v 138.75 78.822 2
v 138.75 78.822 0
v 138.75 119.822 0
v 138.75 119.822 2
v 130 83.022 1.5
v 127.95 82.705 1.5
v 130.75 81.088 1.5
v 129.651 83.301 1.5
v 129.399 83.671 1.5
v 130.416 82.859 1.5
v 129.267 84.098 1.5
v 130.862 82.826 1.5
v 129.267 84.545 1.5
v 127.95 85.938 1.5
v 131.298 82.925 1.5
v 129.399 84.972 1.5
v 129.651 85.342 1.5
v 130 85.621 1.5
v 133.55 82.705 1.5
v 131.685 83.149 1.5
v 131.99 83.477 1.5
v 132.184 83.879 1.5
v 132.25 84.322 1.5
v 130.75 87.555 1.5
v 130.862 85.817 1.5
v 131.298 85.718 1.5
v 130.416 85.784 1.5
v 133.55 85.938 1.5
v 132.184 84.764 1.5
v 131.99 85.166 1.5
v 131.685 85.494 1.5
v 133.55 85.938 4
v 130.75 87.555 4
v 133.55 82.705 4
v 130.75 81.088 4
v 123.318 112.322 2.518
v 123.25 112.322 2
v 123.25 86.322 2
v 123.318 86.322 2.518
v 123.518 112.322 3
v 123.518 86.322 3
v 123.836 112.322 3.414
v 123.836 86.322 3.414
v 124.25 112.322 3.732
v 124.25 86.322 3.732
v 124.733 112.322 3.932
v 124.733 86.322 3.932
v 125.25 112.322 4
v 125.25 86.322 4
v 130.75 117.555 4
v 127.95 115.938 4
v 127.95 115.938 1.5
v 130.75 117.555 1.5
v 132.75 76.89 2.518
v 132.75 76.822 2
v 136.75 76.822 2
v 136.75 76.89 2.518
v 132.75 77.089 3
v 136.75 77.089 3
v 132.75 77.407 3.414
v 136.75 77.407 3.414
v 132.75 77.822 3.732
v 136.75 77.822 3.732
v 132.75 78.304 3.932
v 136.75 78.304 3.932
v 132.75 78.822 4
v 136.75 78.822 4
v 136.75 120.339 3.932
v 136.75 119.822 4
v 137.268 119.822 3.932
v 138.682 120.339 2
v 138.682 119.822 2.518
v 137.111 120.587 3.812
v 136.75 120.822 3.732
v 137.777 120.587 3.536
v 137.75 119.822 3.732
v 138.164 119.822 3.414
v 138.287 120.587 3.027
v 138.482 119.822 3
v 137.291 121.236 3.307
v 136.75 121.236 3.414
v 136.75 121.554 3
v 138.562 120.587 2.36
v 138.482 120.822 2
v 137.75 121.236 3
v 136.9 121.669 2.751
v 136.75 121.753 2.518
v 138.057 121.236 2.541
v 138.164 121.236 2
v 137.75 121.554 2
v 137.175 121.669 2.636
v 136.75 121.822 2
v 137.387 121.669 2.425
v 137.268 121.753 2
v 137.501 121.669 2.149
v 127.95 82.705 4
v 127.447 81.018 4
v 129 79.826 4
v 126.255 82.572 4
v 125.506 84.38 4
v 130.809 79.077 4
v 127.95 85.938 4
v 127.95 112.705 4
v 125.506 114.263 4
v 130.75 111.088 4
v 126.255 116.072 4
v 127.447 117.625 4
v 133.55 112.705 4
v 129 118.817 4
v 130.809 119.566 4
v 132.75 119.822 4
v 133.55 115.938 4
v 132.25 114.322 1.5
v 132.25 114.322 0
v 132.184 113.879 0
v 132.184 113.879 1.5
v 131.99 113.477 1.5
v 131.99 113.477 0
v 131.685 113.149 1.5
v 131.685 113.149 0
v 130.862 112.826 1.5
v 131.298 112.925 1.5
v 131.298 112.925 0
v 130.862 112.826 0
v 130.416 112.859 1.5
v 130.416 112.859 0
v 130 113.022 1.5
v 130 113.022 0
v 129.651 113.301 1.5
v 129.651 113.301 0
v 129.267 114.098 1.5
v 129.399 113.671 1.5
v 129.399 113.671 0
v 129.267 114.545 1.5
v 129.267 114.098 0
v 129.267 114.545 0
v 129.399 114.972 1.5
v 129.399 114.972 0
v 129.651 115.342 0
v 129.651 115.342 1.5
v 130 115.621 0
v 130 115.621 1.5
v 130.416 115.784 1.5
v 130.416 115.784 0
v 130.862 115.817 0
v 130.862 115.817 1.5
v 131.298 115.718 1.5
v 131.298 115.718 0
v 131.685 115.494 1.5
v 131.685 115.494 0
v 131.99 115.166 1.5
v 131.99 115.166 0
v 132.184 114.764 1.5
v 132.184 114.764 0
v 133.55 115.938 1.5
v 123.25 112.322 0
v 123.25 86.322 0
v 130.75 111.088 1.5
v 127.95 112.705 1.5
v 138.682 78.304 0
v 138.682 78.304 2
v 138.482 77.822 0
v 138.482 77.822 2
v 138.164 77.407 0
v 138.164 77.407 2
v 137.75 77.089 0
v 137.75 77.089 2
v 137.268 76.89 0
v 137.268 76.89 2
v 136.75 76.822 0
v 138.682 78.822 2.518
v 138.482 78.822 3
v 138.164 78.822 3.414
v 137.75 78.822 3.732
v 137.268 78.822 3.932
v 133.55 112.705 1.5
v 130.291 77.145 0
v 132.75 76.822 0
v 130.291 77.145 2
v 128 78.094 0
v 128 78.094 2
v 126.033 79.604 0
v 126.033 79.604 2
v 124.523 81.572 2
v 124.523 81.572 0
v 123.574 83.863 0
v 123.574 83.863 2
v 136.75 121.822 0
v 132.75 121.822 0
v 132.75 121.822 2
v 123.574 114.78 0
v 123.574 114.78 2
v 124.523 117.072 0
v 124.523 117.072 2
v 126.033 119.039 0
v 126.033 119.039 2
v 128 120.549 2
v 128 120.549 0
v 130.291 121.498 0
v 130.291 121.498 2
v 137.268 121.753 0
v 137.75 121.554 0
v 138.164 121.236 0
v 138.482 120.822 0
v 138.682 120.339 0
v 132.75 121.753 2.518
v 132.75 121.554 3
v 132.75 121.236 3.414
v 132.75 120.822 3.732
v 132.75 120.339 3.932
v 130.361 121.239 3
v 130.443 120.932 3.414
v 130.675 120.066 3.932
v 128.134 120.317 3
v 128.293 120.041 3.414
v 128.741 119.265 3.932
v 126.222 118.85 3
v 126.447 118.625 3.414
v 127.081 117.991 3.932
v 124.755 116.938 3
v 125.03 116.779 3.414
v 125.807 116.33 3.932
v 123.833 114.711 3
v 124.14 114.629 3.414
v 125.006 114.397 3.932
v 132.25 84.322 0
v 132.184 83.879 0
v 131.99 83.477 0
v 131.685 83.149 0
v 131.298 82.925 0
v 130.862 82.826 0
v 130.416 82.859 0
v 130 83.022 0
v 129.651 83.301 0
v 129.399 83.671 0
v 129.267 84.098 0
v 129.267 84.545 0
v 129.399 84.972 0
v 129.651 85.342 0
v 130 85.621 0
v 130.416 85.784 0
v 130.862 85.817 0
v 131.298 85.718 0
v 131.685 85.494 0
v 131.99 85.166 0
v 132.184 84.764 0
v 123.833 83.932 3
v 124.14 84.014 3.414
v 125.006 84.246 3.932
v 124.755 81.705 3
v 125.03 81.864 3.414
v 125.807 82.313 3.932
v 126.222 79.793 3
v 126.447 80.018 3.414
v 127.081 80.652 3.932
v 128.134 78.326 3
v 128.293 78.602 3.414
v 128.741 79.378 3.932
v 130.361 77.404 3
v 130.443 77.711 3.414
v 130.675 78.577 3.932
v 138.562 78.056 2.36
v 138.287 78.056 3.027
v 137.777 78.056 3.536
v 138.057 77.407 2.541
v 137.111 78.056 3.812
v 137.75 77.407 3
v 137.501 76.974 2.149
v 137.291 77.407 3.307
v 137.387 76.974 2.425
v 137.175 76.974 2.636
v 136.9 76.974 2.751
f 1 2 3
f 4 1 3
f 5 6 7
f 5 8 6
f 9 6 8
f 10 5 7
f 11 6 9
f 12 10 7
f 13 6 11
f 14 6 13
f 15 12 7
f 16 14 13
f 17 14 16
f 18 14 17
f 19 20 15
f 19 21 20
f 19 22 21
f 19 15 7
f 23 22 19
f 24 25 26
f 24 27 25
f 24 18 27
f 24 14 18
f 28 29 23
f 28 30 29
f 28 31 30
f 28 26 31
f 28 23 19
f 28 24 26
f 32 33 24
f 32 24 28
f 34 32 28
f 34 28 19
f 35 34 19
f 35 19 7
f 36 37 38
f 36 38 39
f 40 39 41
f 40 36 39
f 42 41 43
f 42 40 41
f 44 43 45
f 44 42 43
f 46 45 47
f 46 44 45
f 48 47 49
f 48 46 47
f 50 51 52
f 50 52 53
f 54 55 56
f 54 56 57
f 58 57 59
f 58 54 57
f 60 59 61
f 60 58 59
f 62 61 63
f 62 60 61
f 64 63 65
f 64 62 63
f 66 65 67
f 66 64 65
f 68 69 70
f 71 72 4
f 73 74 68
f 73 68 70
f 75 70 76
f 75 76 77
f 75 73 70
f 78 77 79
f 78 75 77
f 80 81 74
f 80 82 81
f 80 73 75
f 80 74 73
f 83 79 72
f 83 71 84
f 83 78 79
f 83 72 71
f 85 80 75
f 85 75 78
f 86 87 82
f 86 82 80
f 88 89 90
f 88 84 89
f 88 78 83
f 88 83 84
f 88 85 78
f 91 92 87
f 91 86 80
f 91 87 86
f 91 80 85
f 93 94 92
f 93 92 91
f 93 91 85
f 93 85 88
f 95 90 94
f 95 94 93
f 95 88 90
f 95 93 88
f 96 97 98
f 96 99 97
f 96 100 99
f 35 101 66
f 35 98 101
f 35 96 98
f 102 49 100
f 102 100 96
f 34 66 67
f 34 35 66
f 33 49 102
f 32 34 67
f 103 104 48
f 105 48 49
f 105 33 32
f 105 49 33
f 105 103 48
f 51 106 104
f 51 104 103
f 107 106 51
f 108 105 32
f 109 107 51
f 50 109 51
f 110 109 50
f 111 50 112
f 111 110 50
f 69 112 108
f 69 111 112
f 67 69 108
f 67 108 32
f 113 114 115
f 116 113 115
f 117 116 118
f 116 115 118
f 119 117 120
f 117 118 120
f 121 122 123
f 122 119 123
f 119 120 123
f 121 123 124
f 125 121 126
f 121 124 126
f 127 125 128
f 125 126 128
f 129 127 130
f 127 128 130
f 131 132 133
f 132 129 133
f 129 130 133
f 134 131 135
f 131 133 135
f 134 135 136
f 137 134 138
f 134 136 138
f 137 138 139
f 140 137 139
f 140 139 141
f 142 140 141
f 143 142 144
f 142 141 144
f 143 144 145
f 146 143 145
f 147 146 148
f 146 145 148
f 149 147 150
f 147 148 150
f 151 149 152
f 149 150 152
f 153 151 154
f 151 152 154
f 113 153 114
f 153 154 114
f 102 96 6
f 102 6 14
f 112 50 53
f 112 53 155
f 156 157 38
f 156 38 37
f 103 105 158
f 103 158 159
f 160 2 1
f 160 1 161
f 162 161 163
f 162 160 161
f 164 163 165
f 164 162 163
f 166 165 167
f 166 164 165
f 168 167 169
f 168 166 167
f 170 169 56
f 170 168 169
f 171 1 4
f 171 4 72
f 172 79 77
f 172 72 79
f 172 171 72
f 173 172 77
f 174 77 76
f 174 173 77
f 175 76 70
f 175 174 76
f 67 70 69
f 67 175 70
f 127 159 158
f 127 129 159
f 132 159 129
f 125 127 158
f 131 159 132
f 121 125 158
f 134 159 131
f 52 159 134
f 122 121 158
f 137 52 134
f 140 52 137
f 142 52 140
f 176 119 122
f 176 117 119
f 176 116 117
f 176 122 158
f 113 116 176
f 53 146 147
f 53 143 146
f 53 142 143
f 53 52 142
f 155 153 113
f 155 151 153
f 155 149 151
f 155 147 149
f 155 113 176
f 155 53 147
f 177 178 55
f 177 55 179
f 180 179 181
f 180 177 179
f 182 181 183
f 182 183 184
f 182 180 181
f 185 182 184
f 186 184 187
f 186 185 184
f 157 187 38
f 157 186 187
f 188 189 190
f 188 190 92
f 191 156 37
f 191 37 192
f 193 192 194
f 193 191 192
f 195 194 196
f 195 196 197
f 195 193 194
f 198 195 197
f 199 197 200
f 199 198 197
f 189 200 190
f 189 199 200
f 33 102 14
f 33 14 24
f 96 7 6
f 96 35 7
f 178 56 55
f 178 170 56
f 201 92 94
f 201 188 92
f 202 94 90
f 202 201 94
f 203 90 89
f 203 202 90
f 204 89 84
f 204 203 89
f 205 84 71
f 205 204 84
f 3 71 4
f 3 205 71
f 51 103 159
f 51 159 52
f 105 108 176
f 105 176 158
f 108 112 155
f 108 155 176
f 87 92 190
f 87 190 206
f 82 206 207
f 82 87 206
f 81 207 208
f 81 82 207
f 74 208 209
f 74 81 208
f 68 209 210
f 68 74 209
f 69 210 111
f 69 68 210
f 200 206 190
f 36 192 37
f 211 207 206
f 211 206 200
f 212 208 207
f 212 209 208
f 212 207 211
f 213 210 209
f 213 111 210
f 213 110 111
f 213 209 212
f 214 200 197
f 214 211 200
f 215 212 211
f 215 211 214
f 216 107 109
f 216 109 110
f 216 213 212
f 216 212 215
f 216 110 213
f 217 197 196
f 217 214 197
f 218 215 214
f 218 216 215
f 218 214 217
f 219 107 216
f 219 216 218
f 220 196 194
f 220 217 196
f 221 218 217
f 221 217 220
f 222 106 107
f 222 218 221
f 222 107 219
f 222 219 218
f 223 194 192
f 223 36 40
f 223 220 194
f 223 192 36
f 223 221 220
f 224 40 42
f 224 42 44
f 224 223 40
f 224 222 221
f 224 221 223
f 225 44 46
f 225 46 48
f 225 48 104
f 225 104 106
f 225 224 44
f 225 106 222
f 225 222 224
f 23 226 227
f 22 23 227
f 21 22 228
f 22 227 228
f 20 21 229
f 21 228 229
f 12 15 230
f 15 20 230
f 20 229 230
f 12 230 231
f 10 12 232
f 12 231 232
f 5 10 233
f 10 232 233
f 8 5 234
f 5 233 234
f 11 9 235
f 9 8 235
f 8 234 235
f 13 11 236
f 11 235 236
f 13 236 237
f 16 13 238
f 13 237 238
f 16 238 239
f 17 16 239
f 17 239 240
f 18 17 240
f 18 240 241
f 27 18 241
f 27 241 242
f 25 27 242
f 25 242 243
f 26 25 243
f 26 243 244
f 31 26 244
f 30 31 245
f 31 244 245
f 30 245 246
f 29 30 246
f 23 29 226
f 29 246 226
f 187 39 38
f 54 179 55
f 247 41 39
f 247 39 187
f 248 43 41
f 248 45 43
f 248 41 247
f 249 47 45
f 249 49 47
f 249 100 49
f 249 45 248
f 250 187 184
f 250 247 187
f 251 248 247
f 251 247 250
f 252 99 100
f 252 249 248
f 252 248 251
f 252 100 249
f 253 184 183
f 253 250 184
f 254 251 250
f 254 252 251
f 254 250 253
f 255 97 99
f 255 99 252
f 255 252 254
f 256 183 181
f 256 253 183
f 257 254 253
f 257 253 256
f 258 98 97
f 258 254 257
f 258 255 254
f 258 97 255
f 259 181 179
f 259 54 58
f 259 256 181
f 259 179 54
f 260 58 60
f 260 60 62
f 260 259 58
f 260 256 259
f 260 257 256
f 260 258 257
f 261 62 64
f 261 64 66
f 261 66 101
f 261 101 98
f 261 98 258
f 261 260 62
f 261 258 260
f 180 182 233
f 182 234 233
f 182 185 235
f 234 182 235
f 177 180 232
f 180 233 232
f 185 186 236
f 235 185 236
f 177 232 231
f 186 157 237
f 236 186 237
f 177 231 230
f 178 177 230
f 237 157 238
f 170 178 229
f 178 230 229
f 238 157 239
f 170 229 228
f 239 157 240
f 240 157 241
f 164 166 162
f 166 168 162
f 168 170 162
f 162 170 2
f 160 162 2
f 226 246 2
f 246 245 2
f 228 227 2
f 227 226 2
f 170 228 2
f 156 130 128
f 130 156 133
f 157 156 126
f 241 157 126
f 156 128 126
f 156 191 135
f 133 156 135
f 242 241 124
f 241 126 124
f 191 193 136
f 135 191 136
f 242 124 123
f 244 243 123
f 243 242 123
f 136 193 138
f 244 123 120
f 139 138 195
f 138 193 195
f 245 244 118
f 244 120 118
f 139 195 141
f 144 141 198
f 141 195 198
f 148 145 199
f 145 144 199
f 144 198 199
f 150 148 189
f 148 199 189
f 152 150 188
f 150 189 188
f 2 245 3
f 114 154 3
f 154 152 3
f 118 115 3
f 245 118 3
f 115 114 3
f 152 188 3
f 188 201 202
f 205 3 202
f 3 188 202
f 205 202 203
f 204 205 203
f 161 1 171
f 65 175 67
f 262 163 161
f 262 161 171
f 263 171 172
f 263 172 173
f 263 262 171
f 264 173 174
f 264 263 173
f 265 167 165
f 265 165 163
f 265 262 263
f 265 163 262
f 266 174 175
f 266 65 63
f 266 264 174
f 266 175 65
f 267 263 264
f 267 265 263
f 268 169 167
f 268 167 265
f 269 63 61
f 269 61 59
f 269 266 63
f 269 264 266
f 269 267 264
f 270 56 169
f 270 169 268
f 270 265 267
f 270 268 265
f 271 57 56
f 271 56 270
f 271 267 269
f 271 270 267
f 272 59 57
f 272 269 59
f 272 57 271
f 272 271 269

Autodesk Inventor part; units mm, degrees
ref_plane "YZ Plane" through (0, 0, 0) normal (1, 0, 0) x (0, 1, 0)
ref_plane "XZ Plane" through (0, 0, 0) normal (0, 1, 0) x (-1, 0, 0)
ref_plane "XY Plane" through (0, 0, 0) normal (0, 0, 1) x (1, 0, 0)
sketch "Эскиз1" plane through (0, 0, 0) normal (0, 0, 1) x (1, 0, 0)
  line L0 (123.2502, 86.3215) -> (123.2502, 112.3215) projected
  circle A0 centre (130.7502, 114.3215) radius 1.5 projected
  circle A1 centre (130.7502, 84.3215) radius 1.5 projected
  line L1 (132.7502, 121.8215) -> (144.7502, 121.8215) projected
  arc A2 (132.7502, 121.8215) -> (123.2502, 112.3215) centre (132.7502, 112.3215) ccw projected
  arc A3 (123.2502, 86.3215) -> (132.7502, 76.8215) centre (132.7502, 86.3215) ccw projected
  line L2 (138.7502, 76.8215) -> (132.7502, 76.8215) projected
  line L3 (138.7502, 88.4715) -> (138.7502, 76.8215) projected
  line L4 (138.7502, 111.4715) -> (138.7502, 98.6715) projected
  line L5 (144.5002, -126.5097) -> (144.5002, 144.1144) projected
  line L6 (138.7502, 76.8215) -> (138.7502, 121.8215)
  point P0 (0, 0)
extrude "Выдавливание1" add sketch "Эскиз1" along normal blind 4
fillet "Сопряжение1" radius 2 6 edges at (123.2502, 99.3215, 4) (126.0327, 79.604, 4) (135.7502, 76.8215, 4) (135.7502, 121.8215, 4) (126.0327, 119.039, 4) (138.7502, 99.3215, 4)
fillet "Сопряжение2" radius 2 4 edges at (138.7502, 121.8215, 1) (138.1644, 121.2357, 3.4142) (138.7502, 76.8215, 1) (138.1644, 77.4073, 3.4142)
sketch "Эскиз2" plane through (0, 0, 4) normal (0, 0, 1) x (1, 0, 0)
  circle A0 centre (130.7502, 114.3215) radius 1.5 projected
  line L0 (130.7502, 117.5547) -> (133.5502, 115.9381)
  line L1 (133.5502, 115.9381) -> (133.5502, 112.7049)
  line L2 (133.5502, 112.7049) -> (130.7502, 111.0883)
  line L3 (130.7502, 111.0883) -> (127.9502, 112.7049)
  line L4 (127.9502, 112.7049) -> (127.9502, 115.9381)
  line L5 (127.9502, 115.9381) -> (130.7502, 117.5547)
  circle A1 centre (130.7502, 84.3215) radius 1.5 projected
  line L6 (130.7502, 87.5547) -> (133.5502, 85.9381)
  line L7 (133.5502, 85.9381) -> (133.5502, 82.7049)
  line L8 (133.5502, 82.7049) -> (130.7502, 81.0883)
  line L9 (130.7502, 81.0883) -> (127.9502, 82.7049)
  line L10 (127.9502, 82.7049) -> (127.9502, 85.9381)
  line L11 (127.9502, 85.9381) -> (130.7502, 87.5547)
  point P0 (0, 0)
  dimension "d4" = 3
  dimension "d5" = 5.6
  dimension "d6" = 5.6
extrude "Выдавливание2" cut sketch "Эскиз2" against normal blind 2.5
properties part number "накладка на петлю"
